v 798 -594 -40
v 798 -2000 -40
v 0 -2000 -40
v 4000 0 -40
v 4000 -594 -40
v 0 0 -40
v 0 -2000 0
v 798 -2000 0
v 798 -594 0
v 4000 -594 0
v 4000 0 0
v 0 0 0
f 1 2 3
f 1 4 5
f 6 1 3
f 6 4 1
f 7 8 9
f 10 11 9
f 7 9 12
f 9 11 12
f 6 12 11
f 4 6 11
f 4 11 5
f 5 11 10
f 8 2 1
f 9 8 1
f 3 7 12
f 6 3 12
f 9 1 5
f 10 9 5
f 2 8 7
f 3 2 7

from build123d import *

# Parameters (mm, degrees)
TABAN_FLAN_1_DEPTH         = 40
KES_EKSTR_ZYON1_DEPTH      = 4473.31483686
KES_EKSTR_ZYON1_DEPTH_BACK = 4473.31483686
IZIM2_W                    = 3200
IZIM2_H                    = 350
KES_EKSTR_ZYON2_DEPTH      = 4473.31483686
KES_EKSTR_ZYON2_DEPTH_BACK = 4473.31483686
IZIM3_W                    = 3200
IZIM3_H                    = 6
KES_EKSTR_ZYON3_DEPTH      = 4473.31483686
KES_EKSTR_ZYON3_DEPTH_BACK = 4473.31483686
IZIM4_W                    = 2
IZIM4_H                    = 1406


# Sheet-metal steps are written as plain solids
with BuildPart() as part:
    # Çizim1 → Taban-Flanş1 (new body)
    with BuildSketch(Plane.XY):
        Polygon((0, 0), (4000, 0), (4000, -950), (800, -950), (800, -2000), (0, -2000), align=None)
    extrude(amount=-TABAN_FLAN_1_DEPTH)

    # Çizim2 → Kes-Ekstrüzyon1 (cut, two sides: drawn at the far end of the back side and taken through both)
    with BuildSketch(Plane.XY.offset(-KES_EKSTR_ZYON1_DEPTH_BACK)):
        with Locations((2400, -775)):
            Rectangle(IZIM2_W, IZIM2_H)
    extrude(amount=KES_EKSTR_ZYON1_DEPTH + KES_EKSTR_ZYON1_DEPTH_BACK, mode=Mode.SUBTRACT)

    # Çizim3 → Kes-Ekstrüzyon2 (cut, two sides: drawn at the far end of the back side and taken through both)
    with BuildSketch(Plane.XY.offset(-KES_EKSTR_ZYON2_DEPTH_BACK)):
        with Locations((2400, -597)):
            Rectangle(IZIM3_W, IZIM3_H)
    extrude(amount=KES_EKSTR_ZYON2_DEPTH + KES_EKSTR_ZYON2_DEPTH_BACK, mode=Mode.SUBTRACT)

    # Çizim4 → Kes-Ekstrüzyon3 (cut, two sides: drawn at the far end of the back side and taken through both)
    with BuildSketch(Plane.XY.offset(-KES_EKSTR_ZYON3_DEPTH_BACK)):
        with Locations((799, -1297)):
            Rectangle(IZIM4_W, IZIM4_H)
    extrude(amount=KES_EKSTR_ZYON3_DEPTH + KES_EKSTR_ZYON3_DEPTH_BACK, mode=Mode.SUBTRACT)


solid = part.part
